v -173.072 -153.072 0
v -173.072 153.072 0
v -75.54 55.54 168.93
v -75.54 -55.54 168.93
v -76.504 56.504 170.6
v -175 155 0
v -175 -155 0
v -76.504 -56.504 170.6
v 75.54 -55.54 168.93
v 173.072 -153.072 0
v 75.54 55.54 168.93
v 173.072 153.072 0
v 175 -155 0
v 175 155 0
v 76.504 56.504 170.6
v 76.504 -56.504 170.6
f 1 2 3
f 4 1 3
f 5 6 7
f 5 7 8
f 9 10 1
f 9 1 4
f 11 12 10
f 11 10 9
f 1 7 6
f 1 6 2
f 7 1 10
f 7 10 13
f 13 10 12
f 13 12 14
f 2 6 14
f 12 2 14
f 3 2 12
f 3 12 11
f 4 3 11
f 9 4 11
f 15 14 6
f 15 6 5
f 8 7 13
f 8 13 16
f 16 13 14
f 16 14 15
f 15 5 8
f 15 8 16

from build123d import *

# Parameters (mm, degrees)
SKETCH1_W           = 350
SKETCH1_H           = 310
BOSS_EXTRUDE1_DEPTH = 170.6
BOSS_EXTRUDE1_TAPER = 30
SHELL1_T            = -1.67


with BuildPart() as part:
    # Sketch1 → Boss-Extrude1 (new body)
    with BuildSketch(Plane.XY):
        Rectangle(SKETCH1_W, SKETCH1_H)
    extrude(amount=BOSS_EXTRUDE1_DEPTH, taper=BOSS_EXTRUDE1_TAPER)

    # Shell1
    shell1_openings = [part.faces().sort_by_distance(p)[0] for p in [
        (0, 0, 0),
    ]]
    offset(amount=SHELL1_T, openings=shell1_openings, kind=Kind.INTERSECTION)


solid = part.part
